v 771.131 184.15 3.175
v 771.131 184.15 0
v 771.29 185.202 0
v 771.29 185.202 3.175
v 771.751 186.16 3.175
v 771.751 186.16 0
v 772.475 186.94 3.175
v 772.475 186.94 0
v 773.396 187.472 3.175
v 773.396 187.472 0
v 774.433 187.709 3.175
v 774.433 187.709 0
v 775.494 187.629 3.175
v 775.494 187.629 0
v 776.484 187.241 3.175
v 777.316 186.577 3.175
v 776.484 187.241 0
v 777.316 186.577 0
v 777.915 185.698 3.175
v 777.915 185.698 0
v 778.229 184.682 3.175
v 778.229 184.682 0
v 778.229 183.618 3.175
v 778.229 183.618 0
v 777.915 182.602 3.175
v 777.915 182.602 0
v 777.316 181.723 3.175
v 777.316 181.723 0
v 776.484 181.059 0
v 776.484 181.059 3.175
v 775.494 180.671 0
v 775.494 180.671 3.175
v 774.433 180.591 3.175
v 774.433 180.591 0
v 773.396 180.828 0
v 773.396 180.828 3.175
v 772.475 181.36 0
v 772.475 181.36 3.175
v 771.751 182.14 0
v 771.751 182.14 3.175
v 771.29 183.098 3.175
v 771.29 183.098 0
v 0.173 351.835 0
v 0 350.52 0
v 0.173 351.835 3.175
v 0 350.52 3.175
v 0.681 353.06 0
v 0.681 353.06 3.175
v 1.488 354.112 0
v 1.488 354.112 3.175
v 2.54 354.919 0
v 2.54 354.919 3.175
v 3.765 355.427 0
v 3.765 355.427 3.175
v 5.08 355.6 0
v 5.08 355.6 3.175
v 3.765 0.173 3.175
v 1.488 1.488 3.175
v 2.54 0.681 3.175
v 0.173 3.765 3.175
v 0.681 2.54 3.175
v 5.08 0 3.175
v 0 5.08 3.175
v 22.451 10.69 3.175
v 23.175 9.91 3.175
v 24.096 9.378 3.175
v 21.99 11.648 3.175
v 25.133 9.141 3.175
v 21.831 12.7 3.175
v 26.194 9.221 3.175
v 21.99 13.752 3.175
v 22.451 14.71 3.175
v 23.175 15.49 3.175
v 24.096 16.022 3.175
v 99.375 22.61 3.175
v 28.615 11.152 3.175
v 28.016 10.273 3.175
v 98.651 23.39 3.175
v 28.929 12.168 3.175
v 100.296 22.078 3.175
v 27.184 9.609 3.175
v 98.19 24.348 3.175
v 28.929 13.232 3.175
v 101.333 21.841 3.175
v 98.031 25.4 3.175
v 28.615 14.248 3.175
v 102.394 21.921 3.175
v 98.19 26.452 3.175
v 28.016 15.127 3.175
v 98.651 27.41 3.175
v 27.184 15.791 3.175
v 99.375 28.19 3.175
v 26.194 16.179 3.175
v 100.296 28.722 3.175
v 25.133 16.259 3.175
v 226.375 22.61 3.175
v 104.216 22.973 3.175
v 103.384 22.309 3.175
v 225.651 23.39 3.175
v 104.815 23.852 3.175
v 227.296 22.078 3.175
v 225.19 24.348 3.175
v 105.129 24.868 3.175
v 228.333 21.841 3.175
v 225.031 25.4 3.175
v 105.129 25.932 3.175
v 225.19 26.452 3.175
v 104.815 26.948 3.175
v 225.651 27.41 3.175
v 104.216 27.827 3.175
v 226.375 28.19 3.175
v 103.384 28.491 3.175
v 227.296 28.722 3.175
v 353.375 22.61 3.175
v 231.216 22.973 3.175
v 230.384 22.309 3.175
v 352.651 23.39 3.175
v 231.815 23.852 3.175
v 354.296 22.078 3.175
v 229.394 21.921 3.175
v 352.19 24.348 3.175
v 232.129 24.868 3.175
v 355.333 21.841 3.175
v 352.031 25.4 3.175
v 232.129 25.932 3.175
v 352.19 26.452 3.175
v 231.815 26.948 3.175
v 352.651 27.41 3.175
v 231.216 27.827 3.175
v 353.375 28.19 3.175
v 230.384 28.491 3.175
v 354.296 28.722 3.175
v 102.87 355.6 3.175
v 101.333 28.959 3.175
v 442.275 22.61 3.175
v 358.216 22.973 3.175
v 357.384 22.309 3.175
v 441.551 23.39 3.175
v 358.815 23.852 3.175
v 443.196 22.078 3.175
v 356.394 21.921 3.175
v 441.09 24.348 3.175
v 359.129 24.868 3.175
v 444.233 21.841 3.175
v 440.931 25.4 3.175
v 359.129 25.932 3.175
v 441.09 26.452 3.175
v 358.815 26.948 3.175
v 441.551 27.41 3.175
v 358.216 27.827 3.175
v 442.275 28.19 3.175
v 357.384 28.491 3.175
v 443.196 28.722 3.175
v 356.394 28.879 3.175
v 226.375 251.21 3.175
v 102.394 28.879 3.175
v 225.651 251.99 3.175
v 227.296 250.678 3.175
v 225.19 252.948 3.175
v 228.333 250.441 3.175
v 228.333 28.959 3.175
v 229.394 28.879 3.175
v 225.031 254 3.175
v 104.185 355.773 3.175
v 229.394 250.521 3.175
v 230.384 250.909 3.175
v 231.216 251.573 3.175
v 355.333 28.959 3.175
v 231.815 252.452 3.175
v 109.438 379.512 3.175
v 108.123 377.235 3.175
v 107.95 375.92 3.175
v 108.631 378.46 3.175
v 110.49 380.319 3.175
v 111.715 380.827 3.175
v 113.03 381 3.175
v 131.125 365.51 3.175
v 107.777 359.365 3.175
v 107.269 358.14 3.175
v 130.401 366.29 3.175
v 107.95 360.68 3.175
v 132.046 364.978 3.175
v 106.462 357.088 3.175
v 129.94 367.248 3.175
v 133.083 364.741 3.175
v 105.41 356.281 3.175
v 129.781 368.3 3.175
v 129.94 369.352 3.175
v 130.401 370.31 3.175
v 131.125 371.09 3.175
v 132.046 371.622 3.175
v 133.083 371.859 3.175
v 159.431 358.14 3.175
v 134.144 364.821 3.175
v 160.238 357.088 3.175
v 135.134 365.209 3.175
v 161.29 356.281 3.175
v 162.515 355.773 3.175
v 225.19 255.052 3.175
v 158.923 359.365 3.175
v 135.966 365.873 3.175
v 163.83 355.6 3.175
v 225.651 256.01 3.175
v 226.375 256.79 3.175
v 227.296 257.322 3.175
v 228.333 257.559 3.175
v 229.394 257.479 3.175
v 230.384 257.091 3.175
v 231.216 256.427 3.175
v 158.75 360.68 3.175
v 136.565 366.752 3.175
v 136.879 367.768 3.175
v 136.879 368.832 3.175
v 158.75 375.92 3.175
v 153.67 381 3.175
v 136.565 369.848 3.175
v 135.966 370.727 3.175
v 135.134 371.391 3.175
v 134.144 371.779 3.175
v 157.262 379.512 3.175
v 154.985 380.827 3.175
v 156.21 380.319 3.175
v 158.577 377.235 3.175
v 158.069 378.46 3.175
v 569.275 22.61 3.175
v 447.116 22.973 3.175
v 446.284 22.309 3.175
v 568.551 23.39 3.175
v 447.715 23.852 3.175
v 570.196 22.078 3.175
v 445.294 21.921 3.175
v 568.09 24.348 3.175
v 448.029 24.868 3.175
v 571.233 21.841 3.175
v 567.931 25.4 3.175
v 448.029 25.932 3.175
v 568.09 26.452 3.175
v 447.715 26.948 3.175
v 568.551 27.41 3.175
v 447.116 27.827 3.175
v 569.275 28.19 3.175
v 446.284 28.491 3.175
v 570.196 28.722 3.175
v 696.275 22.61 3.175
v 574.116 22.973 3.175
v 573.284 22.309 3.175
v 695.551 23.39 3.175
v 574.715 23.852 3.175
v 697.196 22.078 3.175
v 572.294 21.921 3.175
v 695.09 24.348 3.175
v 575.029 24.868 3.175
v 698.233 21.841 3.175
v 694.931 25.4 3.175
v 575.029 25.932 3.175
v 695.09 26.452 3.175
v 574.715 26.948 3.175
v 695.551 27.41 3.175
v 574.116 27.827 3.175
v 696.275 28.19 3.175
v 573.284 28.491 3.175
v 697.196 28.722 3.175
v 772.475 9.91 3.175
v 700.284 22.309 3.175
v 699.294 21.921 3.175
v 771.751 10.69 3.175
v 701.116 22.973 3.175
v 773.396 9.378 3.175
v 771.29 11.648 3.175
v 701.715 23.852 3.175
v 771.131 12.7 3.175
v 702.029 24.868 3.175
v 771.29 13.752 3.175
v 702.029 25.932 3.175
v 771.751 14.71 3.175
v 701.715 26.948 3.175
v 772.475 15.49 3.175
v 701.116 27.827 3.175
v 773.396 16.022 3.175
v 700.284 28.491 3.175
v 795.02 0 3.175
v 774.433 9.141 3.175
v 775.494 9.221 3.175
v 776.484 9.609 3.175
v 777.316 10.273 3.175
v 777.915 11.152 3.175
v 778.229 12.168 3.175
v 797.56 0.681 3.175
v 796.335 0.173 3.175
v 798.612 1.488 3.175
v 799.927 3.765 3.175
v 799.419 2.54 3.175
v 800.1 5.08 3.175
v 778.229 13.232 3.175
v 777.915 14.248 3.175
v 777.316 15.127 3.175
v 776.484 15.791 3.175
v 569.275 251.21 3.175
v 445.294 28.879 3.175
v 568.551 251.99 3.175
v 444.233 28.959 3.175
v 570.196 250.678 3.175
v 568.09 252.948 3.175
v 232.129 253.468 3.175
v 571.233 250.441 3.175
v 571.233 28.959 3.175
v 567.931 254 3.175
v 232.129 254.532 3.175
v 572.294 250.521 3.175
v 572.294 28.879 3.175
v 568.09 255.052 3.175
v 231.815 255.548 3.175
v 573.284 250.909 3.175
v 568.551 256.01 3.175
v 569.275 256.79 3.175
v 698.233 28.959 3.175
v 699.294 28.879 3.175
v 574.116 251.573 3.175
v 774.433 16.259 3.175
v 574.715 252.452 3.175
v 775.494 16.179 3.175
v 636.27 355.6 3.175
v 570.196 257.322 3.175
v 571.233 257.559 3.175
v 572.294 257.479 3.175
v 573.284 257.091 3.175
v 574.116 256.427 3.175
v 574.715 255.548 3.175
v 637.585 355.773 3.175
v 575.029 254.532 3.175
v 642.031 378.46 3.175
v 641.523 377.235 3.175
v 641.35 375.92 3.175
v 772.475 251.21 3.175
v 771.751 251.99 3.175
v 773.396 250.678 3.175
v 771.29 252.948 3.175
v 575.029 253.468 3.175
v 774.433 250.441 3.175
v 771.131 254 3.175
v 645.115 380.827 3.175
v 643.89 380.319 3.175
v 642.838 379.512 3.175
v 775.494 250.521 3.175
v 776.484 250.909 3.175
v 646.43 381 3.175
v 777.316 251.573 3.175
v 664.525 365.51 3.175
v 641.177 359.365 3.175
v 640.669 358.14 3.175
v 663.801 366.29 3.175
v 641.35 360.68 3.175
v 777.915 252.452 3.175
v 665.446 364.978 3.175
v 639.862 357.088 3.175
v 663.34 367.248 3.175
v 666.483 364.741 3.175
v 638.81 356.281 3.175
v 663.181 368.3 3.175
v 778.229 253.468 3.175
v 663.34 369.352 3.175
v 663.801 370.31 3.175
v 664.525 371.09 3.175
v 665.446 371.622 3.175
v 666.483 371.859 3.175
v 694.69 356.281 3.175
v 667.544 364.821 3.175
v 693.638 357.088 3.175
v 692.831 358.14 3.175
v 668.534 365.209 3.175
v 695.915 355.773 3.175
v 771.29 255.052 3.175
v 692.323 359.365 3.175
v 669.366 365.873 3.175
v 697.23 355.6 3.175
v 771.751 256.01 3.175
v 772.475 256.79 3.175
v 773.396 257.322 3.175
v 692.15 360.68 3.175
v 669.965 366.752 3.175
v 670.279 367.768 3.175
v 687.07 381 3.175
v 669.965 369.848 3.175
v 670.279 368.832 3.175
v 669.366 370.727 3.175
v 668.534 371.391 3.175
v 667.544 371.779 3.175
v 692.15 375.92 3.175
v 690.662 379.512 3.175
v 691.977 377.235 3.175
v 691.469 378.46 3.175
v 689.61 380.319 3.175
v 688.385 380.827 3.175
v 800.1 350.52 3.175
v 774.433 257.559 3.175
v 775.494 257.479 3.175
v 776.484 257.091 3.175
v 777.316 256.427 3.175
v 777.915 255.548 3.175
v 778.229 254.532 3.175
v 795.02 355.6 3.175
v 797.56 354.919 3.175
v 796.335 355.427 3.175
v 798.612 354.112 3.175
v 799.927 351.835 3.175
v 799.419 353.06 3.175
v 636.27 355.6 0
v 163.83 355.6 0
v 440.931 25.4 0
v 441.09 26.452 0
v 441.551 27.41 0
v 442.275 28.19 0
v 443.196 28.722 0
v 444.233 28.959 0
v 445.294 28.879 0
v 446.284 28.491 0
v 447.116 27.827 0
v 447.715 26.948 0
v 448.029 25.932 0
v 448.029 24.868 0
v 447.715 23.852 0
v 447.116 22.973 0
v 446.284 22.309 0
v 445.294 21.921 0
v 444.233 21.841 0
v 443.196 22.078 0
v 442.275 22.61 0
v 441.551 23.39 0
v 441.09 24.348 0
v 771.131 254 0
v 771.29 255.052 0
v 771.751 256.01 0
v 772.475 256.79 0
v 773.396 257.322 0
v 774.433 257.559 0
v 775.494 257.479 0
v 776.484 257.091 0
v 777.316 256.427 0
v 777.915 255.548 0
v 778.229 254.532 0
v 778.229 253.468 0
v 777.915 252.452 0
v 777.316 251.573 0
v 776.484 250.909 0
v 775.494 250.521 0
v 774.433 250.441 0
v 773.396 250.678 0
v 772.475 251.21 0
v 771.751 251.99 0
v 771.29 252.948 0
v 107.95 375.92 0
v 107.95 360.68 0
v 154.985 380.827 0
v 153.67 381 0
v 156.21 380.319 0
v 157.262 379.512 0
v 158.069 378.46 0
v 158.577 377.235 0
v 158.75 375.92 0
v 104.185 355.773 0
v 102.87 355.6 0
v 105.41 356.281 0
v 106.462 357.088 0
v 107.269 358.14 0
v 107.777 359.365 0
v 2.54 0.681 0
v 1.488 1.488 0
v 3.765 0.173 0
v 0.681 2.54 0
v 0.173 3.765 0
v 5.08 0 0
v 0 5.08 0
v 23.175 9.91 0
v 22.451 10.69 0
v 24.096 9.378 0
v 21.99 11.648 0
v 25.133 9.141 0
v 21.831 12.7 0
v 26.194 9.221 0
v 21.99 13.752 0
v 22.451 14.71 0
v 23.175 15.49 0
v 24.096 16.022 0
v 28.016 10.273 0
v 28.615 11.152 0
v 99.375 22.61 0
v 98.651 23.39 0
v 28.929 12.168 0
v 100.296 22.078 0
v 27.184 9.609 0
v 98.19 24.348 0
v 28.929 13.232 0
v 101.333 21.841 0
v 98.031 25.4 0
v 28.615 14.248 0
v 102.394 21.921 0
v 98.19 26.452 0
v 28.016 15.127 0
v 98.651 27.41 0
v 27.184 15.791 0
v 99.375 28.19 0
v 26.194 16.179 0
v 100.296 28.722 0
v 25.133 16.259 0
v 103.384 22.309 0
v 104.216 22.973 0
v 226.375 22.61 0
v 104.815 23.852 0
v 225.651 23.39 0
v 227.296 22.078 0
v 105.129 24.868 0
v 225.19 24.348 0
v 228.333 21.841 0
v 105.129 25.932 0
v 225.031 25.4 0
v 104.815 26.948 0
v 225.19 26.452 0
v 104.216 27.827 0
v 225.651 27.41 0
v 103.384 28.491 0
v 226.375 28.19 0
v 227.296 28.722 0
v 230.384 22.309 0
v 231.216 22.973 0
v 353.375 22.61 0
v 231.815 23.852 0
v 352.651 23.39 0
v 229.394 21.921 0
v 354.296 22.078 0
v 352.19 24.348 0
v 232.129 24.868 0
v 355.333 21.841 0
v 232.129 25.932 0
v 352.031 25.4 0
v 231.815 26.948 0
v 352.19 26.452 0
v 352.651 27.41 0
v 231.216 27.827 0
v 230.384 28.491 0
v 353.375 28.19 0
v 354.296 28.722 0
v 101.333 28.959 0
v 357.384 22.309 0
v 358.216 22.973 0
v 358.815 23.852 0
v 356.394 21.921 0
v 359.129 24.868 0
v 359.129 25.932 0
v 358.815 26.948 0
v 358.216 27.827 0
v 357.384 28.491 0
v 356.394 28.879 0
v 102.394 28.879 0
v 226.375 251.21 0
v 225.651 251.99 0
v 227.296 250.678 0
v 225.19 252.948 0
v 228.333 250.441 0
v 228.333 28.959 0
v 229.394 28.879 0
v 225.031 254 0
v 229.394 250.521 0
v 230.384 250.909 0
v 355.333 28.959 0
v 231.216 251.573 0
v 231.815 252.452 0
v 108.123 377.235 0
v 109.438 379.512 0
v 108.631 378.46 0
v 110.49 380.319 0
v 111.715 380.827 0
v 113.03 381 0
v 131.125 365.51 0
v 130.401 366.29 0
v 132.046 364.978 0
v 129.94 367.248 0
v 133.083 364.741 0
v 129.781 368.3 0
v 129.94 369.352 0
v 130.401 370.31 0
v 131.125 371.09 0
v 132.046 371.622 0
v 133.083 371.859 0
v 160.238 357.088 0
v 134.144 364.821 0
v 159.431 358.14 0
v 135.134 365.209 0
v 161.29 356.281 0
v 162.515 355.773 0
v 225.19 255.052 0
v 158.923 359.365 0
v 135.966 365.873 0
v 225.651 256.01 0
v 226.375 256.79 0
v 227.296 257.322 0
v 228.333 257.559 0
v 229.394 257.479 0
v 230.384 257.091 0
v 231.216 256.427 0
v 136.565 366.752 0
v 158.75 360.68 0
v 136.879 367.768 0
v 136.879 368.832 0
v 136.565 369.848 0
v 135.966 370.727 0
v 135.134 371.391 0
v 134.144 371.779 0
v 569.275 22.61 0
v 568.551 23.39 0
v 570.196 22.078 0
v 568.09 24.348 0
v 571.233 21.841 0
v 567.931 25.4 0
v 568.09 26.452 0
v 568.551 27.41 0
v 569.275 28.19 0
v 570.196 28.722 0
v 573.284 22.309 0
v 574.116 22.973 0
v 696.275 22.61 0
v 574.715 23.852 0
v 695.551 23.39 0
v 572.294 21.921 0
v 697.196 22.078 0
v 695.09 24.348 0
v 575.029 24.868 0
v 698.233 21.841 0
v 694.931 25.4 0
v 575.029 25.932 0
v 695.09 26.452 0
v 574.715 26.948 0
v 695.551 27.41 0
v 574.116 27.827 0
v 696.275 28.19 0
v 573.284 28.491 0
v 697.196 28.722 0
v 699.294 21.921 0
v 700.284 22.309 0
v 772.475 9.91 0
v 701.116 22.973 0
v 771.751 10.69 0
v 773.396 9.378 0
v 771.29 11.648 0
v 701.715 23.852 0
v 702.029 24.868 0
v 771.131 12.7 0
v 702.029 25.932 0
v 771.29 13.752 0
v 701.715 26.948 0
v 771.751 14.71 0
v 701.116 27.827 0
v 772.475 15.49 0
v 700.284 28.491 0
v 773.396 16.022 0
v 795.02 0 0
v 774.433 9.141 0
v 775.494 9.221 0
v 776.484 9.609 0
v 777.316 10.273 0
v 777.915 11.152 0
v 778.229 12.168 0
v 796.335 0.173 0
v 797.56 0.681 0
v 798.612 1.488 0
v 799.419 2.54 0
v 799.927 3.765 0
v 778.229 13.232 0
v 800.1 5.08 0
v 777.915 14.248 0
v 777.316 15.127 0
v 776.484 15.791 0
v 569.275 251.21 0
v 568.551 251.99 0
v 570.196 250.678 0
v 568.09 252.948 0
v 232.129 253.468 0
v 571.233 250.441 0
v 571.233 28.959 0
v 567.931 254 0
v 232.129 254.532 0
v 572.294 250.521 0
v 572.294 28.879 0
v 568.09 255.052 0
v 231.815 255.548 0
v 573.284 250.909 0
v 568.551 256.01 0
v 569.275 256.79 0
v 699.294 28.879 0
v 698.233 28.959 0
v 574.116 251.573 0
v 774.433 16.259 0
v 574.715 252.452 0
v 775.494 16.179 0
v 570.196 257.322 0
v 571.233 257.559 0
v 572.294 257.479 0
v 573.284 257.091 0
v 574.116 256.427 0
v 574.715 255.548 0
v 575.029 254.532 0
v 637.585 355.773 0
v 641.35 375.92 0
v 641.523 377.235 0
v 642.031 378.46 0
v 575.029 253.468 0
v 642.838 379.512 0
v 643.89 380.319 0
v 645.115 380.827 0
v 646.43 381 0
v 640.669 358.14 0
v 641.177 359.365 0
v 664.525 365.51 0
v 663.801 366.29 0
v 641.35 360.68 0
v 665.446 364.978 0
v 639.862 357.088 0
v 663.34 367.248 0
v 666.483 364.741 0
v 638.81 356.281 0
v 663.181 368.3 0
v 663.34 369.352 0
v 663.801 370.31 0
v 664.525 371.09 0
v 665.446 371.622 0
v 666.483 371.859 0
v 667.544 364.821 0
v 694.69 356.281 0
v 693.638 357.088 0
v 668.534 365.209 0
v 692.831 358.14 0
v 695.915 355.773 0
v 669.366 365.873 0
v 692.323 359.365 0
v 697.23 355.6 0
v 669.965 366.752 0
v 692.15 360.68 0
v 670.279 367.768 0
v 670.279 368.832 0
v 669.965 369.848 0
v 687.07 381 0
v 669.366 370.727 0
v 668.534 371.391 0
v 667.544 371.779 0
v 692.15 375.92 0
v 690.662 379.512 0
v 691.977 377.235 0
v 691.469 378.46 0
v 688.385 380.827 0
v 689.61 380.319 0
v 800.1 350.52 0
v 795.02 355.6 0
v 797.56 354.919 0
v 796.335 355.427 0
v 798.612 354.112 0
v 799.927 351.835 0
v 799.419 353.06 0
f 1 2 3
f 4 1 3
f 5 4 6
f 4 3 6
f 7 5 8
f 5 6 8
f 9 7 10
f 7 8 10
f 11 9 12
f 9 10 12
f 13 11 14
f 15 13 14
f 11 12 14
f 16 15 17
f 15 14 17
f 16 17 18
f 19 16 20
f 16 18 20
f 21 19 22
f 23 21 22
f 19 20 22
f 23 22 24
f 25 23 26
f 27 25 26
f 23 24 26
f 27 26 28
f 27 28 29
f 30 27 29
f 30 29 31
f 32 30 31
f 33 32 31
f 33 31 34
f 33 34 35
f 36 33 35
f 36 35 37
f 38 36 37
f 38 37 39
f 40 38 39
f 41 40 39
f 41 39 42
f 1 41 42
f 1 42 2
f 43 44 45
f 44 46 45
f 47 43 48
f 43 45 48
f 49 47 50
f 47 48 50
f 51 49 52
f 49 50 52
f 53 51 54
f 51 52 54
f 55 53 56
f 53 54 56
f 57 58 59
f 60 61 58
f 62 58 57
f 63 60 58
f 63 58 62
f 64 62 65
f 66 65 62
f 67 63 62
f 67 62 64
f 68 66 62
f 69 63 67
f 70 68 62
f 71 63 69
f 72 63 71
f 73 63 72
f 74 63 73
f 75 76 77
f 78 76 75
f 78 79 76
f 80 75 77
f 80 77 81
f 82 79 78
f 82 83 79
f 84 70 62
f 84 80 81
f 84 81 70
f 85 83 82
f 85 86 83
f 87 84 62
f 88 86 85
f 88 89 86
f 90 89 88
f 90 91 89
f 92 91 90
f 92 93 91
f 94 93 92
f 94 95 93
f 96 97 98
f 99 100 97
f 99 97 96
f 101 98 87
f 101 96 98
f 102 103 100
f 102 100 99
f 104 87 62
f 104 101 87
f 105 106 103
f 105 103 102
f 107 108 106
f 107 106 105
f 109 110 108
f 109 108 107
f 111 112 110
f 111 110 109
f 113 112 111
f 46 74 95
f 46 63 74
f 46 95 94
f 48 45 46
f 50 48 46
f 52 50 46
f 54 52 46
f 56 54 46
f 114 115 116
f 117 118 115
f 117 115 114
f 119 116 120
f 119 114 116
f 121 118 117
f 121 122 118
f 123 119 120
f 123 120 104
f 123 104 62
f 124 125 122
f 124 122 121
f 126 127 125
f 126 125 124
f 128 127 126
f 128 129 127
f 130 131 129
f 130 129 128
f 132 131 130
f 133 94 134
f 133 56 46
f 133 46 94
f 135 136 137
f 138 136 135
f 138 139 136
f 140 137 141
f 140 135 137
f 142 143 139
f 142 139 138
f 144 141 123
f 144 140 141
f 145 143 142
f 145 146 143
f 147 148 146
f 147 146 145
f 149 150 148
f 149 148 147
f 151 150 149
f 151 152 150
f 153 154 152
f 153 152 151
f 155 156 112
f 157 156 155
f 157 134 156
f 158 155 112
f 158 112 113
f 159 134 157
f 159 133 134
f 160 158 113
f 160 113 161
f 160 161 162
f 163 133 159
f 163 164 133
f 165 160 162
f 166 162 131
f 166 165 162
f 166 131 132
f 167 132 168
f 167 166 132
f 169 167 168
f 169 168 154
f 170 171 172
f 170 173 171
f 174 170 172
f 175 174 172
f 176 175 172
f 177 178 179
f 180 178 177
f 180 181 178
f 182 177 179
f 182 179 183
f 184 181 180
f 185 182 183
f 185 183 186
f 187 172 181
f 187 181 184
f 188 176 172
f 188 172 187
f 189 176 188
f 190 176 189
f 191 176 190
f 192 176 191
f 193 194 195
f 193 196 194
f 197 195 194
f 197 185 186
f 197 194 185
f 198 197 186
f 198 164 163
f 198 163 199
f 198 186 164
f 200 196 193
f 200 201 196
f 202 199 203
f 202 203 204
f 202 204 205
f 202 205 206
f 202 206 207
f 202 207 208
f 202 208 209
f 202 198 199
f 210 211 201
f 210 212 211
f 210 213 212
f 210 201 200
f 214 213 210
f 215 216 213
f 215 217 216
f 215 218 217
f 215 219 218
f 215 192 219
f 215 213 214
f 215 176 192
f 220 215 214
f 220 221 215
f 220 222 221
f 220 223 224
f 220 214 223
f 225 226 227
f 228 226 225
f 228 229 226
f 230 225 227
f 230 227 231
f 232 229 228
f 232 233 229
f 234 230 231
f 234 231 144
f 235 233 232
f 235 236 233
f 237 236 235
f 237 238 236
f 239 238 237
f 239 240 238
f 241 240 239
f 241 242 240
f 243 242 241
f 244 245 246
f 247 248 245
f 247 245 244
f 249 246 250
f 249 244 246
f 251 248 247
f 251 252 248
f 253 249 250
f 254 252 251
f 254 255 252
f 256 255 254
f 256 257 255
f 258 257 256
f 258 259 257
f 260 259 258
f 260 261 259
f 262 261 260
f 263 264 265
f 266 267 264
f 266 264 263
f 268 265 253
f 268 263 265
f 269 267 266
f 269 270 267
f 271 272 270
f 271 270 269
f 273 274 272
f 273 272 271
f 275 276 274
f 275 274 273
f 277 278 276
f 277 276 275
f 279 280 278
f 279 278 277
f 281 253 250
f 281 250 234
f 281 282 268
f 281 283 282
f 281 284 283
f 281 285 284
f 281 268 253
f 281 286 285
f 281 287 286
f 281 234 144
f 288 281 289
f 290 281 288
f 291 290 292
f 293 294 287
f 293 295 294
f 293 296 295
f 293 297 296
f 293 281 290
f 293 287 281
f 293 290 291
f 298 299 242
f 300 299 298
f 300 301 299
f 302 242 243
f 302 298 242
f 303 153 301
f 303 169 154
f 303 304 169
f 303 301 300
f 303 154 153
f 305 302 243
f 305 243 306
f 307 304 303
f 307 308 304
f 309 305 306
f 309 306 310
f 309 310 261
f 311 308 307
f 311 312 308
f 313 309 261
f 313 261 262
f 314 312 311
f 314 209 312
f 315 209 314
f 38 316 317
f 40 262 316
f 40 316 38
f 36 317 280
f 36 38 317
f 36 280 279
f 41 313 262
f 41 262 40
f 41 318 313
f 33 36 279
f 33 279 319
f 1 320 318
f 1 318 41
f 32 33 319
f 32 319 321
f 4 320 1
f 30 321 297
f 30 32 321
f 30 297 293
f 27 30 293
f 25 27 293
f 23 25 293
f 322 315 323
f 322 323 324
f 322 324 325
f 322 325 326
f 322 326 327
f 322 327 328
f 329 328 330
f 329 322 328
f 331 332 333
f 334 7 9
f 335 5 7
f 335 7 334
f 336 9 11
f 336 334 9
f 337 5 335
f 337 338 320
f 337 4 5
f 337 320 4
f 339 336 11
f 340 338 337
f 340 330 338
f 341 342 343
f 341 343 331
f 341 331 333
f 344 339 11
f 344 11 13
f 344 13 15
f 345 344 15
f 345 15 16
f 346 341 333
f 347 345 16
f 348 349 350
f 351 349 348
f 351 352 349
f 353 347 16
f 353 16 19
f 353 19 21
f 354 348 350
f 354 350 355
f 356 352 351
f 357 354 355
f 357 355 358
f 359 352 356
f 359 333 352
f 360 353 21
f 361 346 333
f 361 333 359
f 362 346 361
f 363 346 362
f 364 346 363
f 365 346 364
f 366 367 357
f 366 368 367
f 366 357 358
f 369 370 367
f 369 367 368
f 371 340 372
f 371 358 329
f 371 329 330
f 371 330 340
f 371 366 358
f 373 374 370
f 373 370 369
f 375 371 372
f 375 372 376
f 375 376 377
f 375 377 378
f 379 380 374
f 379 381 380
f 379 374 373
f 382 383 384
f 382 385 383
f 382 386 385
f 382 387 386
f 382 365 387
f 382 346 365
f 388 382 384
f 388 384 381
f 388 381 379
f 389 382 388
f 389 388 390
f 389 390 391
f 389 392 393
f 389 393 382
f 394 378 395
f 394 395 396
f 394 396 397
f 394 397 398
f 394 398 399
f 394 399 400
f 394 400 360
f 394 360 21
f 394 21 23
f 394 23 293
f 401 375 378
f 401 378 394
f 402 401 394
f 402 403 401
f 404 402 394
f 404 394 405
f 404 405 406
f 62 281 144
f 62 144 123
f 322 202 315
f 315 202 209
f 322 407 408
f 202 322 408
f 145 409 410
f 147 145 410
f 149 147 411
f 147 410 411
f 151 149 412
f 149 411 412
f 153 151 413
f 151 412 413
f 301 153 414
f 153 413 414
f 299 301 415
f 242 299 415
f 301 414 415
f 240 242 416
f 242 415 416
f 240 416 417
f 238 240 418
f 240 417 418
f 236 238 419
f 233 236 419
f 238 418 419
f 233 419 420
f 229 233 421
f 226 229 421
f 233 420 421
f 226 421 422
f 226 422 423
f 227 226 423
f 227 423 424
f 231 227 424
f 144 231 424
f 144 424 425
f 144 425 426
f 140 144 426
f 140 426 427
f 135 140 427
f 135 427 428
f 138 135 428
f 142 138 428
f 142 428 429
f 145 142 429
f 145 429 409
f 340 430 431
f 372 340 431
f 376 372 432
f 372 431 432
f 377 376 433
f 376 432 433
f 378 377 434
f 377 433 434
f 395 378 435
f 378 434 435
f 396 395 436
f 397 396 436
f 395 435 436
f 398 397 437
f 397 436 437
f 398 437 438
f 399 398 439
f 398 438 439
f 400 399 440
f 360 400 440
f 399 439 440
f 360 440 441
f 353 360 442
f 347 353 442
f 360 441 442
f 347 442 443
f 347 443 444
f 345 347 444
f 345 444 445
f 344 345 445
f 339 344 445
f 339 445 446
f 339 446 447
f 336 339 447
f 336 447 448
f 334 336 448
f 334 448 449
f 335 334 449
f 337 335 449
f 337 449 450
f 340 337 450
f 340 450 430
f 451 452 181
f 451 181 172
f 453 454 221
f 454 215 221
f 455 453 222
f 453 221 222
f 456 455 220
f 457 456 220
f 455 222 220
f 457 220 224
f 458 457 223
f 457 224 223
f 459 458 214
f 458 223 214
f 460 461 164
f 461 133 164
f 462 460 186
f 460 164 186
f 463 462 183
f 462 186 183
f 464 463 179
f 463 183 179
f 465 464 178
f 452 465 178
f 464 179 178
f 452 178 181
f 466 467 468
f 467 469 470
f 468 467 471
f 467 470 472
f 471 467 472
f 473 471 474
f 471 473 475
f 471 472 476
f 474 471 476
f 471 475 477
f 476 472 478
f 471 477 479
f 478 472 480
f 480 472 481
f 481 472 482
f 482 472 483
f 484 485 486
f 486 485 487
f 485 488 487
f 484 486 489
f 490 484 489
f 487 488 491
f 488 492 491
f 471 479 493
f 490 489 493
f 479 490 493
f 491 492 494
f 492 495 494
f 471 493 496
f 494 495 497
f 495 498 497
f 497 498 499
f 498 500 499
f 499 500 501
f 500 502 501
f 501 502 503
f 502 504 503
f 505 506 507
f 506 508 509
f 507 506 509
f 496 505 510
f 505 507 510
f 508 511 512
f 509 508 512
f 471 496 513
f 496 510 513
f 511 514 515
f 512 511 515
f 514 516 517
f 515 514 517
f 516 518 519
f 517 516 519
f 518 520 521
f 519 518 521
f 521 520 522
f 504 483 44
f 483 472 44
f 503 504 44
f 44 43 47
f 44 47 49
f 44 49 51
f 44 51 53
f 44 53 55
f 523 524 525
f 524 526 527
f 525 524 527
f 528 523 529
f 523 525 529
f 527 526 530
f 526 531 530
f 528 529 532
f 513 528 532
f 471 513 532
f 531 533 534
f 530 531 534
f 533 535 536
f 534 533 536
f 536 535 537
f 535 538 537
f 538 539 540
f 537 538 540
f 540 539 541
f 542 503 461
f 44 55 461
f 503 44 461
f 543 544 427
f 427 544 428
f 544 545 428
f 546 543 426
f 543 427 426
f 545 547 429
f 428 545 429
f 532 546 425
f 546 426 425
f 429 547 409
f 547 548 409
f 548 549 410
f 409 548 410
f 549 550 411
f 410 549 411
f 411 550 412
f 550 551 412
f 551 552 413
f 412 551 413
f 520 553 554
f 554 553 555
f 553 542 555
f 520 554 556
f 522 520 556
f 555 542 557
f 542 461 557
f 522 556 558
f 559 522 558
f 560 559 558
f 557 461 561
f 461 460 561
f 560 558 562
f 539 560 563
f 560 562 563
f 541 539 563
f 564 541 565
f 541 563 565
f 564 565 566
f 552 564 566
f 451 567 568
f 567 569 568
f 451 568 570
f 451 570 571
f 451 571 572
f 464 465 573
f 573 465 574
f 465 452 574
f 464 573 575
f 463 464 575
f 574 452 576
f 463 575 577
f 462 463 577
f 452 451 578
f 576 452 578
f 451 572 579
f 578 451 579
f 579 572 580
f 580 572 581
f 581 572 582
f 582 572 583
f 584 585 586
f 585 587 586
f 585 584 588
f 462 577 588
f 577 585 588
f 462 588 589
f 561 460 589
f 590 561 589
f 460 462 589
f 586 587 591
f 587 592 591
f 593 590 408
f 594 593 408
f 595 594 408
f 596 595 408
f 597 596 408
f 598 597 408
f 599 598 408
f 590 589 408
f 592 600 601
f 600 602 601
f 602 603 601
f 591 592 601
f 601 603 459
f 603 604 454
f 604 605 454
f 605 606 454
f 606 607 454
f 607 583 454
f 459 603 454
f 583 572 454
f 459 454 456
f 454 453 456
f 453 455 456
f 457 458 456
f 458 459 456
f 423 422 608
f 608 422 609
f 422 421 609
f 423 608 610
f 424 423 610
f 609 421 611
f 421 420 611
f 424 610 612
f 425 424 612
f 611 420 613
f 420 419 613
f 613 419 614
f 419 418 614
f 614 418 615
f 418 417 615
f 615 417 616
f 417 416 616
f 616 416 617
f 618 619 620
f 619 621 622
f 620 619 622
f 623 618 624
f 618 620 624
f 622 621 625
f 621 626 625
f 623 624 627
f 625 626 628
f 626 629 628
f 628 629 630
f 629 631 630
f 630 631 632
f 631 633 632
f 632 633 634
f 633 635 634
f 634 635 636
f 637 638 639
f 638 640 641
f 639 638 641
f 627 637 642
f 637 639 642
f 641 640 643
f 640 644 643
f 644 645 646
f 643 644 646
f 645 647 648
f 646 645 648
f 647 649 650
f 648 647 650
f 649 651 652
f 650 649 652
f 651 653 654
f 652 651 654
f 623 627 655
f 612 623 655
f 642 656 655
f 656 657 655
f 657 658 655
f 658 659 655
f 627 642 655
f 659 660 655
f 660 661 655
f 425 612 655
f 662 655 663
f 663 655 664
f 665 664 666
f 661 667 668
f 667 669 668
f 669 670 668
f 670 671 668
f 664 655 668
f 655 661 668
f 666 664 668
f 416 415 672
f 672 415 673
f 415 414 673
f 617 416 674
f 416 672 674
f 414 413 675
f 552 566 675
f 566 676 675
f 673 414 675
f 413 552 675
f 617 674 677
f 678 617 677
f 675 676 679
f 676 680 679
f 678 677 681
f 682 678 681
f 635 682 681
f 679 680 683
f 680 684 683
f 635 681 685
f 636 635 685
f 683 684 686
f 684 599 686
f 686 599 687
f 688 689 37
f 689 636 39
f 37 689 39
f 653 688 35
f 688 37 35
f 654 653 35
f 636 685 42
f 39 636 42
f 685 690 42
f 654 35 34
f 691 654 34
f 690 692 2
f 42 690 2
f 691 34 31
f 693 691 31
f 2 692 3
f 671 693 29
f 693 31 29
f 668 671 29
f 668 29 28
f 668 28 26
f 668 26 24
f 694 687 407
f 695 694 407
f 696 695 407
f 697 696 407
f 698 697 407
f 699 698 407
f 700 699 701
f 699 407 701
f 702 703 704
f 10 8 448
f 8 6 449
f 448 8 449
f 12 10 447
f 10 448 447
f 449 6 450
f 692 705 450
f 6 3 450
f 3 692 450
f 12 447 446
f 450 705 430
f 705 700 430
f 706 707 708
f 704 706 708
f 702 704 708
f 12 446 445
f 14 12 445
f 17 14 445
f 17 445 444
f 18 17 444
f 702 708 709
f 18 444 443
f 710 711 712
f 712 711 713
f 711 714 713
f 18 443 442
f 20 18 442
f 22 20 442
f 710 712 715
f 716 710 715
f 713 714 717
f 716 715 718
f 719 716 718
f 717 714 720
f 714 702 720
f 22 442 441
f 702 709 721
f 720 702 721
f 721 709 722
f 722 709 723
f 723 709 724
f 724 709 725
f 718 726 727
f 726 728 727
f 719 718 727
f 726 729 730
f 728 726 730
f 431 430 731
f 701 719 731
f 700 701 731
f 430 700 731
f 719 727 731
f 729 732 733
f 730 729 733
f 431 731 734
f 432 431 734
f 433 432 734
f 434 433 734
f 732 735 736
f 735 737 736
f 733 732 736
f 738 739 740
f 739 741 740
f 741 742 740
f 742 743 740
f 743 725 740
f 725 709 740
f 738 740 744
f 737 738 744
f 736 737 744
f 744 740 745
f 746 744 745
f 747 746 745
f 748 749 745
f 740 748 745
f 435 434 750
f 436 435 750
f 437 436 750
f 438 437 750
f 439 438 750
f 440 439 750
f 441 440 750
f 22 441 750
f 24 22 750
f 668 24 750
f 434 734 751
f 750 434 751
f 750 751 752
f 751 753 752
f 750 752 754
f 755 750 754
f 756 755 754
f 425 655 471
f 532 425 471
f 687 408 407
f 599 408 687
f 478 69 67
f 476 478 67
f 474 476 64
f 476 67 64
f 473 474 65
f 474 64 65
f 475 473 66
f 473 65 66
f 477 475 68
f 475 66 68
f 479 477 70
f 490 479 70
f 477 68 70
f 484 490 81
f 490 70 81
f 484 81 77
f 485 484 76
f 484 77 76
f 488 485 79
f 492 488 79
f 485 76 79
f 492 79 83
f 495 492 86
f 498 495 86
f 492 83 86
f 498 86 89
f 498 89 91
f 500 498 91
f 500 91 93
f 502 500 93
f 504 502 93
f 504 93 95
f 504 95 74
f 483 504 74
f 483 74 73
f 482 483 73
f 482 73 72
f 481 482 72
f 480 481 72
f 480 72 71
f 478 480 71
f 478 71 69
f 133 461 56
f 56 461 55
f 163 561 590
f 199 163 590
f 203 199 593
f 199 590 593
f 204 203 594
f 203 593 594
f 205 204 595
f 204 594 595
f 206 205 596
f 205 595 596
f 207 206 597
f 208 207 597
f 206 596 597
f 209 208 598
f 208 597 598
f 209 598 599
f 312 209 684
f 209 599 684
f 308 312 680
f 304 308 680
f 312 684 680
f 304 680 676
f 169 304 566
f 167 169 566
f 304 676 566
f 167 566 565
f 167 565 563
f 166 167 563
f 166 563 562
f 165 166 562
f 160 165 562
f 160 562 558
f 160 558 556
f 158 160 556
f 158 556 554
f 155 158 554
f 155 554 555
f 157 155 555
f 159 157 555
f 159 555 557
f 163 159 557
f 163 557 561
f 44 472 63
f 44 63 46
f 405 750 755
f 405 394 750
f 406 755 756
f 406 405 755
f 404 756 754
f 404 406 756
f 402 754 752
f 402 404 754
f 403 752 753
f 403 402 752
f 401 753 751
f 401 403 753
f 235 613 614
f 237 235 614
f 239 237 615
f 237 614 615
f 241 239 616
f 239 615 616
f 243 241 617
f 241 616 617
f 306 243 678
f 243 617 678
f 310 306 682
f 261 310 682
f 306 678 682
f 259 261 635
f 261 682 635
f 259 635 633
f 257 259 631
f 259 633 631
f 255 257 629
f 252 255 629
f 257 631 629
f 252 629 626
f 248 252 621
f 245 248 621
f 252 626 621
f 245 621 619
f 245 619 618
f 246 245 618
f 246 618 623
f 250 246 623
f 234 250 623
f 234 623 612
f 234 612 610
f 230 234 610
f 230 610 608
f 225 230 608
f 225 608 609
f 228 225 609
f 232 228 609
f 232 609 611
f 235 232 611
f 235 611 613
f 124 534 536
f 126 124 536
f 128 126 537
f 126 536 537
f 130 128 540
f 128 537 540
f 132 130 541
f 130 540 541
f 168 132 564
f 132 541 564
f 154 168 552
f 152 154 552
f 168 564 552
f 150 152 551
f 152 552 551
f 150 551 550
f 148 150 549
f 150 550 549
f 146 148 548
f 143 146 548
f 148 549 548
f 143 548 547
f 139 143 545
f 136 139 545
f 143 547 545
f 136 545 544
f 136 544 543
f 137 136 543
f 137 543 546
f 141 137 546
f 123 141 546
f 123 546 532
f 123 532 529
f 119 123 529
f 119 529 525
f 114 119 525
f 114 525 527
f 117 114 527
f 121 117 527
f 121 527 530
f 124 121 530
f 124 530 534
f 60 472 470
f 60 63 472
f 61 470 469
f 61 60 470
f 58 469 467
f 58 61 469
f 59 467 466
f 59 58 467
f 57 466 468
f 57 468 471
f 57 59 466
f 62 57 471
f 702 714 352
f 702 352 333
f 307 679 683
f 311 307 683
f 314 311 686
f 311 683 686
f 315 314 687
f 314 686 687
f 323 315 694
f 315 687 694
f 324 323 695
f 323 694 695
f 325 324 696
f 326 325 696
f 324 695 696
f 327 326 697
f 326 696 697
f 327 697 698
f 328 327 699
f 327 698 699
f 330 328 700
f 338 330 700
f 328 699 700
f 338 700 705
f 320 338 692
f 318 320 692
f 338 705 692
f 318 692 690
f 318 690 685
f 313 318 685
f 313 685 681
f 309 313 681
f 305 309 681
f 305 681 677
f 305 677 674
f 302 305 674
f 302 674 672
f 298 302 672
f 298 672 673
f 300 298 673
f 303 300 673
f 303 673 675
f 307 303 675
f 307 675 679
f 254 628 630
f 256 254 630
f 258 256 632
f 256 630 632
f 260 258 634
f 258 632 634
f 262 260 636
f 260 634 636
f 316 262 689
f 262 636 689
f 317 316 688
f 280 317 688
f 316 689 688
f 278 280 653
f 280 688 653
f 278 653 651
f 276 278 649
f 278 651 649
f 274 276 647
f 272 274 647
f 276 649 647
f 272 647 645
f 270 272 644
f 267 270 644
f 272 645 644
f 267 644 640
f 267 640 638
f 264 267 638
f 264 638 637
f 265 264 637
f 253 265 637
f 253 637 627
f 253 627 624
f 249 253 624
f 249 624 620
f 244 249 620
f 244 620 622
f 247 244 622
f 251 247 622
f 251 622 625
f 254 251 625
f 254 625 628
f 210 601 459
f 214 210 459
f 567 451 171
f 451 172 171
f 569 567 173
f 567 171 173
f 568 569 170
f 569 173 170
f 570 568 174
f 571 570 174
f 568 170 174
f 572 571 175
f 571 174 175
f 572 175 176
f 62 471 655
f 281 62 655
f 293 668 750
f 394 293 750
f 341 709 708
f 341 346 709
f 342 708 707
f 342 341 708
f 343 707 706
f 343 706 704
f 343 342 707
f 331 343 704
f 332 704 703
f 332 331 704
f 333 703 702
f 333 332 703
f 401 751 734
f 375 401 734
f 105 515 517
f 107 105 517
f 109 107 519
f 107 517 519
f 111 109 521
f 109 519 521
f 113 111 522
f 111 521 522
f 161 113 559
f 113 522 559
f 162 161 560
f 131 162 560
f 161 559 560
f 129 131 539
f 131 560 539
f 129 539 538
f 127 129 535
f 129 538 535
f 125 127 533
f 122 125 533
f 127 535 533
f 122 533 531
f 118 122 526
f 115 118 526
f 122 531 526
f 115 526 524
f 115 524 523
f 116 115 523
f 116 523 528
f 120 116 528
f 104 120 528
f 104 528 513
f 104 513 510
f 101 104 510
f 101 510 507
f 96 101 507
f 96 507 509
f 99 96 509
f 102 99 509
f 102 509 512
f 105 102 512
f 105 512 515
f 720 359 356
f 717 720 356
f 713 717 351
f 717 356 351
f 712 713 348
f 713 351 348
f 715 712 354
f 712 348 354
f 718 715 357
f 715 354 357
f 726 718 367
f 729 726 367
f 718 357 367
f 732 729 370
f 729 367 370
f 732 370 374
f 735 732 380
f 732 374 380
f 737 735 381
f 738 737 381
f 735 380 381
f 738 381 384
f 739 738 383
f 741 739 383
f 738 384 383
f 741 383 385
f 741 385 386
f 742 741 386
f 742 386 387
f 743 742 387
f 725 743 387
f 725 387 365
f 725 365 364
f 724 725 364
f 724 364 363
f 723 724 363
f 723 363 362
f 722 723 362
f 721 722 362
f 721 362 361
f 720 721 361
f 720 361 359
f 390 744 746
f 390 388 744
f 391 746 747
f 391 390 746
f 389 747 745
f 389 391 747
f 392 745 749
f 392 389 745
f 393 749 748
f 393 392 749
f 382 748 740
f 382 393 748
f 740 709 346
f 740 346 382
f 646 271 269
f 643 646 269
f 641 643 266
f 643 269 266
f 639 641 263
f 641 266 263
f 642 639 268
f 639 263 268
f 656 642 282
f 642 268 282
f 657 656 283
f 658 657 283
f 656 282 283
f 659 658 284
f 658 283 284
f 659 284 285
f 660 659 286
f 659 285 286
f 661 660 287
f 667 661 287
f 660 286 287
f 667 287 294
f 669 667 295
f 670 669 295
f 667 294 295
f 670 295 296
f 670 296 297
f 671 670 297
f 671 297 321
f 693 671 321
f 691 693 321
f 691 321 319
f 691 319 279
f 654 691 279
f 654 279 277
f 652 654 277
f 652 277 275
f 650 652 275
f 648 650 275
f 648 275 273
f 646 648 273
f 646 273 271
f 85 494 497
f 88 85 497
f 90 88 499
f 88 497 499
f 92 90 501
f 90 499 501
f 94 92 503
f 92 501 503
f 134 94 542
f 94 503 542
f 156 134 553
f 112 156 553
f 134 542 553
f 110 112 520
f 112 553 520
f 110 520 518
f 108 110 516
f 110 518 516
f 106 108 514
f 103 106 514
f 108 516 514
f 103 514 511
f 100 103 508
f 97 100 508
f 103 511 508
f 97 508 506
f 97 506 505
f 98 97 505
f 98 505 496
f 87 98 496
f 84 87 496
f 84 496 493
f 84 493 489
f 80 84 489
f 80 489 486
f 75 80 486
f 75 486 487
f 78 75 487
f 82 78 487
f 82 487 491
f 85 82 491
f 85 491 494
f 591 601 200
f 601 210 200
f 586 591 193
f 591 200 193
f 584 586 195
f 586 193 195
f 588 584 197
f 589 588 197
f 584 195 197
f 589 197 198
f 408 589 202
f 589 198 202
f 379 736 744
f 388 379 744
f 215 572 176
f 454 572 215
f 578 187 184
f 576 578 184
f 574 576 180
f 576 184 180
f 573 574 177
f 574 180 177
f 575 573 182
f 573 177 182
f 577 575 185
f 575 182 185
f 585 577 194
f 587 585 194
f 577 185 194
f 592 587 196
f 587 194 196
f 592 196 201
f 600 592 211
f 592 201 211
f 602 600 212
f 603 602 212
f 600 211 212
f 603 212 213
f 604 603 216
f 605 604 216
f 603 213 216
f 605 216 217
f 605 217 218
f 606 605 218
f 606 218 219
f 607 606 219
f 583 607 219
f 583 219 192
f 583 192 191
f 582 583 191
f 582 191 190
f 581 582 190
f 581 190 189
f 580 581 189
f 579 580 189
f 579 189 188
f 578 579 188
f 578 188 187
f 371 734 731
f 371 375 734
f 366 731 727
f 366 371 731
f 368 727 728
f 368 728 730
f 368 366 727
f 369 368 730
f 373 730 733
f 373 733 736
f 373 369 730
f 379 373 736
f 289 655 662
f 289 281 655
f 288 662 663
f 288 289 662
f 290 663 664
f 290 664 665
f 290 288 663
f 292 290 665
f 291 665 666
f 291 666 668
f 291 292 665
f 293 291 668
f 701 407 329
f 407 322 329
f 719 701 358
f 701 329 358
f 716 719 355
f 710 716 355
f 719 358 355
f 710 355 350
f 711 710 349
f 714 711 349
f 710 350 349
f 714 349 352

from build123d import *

# Parameters (mm, degrees)
F0_W     = 107.95
F0_H     = 355.6
F0_W_2   = 50.8
F0_H_2   = 25.4
F1_DEPTH = 3.175
F2_D     = 7.1374
F3_R     = 5.08
F5_D     = 7.1374


# Not quite as in the source:
# - a feature names something its author has since deleted; it is built from what else it names


with BuildPart() as f1:
    # F0 (on Top) → F1 (new body)
    with BuildSketch(Plane.XY):
        with Locations((53.975, 177.8)):
            Rectangle(F0_W, F0_H)
        Polygon((107.95, 355.6), (107.95, 0), (400.05, 0), (400.05, 355.6), (158.75, 355.6), align=None)
        with Locations((133.35, 368.3)):
            Rectangle(F0_W_2, F0_H_2)
        Polygon((400.05, 355.6), (400.05, 0), (692.15, 0), (692.15, 355.6), (641.35, 355.6), align=None)
        with Locations((746.125, 177.8)):
            Rectangle(F0_W, F0_H)
        with Locations((666.75, 368.3)):
            Rectangle(F0_W_2, F0_H_2)
    extrude(amount=F1_DEPTH)

    # F2 (through all)
    with Locations(Plane(origin=(0, 0, 0), x_dir=(1, 0, 0), z_dir=(0, 0, -1))):
        with Locations((133.35, -368.3), (666.75, -368.3), (25.4, -12.7), (774.7, -12.7)):
            Hole(F2_D / 2)

    # F3
    f3_edges = [f1.edges().sort_by_distance(p)[0] for p in [
        (0, 355.6, 1.5875),
        (107.95, 355.6, 1.5875),
        (107.95, 381, 1.5875),
        (158.75, 381, 1.5875),
        (158.75, 355.6, 1.5875),
        (692.15, 355.6, 1.5875),
        (692.15, 381, 1.5875),
        (641.35, 381, 1.5875),
        (641.35, 355.6, 1.5875),
        (800.1, 355.6, 1.5875),
        (800.1, 0, 1.5875),
        (0, 0, 1.5875),
    ]]
    fillet(f3_edges, radius=F3_R)

    # F5 (through all)
    with Locations(Plane.XY.offset(3.175)):
        with Locations((571.5, 254), (774.7, 254), (444.5, 25.4), (571.5, 25.4), (698.5, 25.4), (774.7, 184.15), (101.6, 25.4), (228.6, 25.4), (355.6, 25.4), (228.6, 254)):
            Hole(F5_D / 2)


solid = f1.part
